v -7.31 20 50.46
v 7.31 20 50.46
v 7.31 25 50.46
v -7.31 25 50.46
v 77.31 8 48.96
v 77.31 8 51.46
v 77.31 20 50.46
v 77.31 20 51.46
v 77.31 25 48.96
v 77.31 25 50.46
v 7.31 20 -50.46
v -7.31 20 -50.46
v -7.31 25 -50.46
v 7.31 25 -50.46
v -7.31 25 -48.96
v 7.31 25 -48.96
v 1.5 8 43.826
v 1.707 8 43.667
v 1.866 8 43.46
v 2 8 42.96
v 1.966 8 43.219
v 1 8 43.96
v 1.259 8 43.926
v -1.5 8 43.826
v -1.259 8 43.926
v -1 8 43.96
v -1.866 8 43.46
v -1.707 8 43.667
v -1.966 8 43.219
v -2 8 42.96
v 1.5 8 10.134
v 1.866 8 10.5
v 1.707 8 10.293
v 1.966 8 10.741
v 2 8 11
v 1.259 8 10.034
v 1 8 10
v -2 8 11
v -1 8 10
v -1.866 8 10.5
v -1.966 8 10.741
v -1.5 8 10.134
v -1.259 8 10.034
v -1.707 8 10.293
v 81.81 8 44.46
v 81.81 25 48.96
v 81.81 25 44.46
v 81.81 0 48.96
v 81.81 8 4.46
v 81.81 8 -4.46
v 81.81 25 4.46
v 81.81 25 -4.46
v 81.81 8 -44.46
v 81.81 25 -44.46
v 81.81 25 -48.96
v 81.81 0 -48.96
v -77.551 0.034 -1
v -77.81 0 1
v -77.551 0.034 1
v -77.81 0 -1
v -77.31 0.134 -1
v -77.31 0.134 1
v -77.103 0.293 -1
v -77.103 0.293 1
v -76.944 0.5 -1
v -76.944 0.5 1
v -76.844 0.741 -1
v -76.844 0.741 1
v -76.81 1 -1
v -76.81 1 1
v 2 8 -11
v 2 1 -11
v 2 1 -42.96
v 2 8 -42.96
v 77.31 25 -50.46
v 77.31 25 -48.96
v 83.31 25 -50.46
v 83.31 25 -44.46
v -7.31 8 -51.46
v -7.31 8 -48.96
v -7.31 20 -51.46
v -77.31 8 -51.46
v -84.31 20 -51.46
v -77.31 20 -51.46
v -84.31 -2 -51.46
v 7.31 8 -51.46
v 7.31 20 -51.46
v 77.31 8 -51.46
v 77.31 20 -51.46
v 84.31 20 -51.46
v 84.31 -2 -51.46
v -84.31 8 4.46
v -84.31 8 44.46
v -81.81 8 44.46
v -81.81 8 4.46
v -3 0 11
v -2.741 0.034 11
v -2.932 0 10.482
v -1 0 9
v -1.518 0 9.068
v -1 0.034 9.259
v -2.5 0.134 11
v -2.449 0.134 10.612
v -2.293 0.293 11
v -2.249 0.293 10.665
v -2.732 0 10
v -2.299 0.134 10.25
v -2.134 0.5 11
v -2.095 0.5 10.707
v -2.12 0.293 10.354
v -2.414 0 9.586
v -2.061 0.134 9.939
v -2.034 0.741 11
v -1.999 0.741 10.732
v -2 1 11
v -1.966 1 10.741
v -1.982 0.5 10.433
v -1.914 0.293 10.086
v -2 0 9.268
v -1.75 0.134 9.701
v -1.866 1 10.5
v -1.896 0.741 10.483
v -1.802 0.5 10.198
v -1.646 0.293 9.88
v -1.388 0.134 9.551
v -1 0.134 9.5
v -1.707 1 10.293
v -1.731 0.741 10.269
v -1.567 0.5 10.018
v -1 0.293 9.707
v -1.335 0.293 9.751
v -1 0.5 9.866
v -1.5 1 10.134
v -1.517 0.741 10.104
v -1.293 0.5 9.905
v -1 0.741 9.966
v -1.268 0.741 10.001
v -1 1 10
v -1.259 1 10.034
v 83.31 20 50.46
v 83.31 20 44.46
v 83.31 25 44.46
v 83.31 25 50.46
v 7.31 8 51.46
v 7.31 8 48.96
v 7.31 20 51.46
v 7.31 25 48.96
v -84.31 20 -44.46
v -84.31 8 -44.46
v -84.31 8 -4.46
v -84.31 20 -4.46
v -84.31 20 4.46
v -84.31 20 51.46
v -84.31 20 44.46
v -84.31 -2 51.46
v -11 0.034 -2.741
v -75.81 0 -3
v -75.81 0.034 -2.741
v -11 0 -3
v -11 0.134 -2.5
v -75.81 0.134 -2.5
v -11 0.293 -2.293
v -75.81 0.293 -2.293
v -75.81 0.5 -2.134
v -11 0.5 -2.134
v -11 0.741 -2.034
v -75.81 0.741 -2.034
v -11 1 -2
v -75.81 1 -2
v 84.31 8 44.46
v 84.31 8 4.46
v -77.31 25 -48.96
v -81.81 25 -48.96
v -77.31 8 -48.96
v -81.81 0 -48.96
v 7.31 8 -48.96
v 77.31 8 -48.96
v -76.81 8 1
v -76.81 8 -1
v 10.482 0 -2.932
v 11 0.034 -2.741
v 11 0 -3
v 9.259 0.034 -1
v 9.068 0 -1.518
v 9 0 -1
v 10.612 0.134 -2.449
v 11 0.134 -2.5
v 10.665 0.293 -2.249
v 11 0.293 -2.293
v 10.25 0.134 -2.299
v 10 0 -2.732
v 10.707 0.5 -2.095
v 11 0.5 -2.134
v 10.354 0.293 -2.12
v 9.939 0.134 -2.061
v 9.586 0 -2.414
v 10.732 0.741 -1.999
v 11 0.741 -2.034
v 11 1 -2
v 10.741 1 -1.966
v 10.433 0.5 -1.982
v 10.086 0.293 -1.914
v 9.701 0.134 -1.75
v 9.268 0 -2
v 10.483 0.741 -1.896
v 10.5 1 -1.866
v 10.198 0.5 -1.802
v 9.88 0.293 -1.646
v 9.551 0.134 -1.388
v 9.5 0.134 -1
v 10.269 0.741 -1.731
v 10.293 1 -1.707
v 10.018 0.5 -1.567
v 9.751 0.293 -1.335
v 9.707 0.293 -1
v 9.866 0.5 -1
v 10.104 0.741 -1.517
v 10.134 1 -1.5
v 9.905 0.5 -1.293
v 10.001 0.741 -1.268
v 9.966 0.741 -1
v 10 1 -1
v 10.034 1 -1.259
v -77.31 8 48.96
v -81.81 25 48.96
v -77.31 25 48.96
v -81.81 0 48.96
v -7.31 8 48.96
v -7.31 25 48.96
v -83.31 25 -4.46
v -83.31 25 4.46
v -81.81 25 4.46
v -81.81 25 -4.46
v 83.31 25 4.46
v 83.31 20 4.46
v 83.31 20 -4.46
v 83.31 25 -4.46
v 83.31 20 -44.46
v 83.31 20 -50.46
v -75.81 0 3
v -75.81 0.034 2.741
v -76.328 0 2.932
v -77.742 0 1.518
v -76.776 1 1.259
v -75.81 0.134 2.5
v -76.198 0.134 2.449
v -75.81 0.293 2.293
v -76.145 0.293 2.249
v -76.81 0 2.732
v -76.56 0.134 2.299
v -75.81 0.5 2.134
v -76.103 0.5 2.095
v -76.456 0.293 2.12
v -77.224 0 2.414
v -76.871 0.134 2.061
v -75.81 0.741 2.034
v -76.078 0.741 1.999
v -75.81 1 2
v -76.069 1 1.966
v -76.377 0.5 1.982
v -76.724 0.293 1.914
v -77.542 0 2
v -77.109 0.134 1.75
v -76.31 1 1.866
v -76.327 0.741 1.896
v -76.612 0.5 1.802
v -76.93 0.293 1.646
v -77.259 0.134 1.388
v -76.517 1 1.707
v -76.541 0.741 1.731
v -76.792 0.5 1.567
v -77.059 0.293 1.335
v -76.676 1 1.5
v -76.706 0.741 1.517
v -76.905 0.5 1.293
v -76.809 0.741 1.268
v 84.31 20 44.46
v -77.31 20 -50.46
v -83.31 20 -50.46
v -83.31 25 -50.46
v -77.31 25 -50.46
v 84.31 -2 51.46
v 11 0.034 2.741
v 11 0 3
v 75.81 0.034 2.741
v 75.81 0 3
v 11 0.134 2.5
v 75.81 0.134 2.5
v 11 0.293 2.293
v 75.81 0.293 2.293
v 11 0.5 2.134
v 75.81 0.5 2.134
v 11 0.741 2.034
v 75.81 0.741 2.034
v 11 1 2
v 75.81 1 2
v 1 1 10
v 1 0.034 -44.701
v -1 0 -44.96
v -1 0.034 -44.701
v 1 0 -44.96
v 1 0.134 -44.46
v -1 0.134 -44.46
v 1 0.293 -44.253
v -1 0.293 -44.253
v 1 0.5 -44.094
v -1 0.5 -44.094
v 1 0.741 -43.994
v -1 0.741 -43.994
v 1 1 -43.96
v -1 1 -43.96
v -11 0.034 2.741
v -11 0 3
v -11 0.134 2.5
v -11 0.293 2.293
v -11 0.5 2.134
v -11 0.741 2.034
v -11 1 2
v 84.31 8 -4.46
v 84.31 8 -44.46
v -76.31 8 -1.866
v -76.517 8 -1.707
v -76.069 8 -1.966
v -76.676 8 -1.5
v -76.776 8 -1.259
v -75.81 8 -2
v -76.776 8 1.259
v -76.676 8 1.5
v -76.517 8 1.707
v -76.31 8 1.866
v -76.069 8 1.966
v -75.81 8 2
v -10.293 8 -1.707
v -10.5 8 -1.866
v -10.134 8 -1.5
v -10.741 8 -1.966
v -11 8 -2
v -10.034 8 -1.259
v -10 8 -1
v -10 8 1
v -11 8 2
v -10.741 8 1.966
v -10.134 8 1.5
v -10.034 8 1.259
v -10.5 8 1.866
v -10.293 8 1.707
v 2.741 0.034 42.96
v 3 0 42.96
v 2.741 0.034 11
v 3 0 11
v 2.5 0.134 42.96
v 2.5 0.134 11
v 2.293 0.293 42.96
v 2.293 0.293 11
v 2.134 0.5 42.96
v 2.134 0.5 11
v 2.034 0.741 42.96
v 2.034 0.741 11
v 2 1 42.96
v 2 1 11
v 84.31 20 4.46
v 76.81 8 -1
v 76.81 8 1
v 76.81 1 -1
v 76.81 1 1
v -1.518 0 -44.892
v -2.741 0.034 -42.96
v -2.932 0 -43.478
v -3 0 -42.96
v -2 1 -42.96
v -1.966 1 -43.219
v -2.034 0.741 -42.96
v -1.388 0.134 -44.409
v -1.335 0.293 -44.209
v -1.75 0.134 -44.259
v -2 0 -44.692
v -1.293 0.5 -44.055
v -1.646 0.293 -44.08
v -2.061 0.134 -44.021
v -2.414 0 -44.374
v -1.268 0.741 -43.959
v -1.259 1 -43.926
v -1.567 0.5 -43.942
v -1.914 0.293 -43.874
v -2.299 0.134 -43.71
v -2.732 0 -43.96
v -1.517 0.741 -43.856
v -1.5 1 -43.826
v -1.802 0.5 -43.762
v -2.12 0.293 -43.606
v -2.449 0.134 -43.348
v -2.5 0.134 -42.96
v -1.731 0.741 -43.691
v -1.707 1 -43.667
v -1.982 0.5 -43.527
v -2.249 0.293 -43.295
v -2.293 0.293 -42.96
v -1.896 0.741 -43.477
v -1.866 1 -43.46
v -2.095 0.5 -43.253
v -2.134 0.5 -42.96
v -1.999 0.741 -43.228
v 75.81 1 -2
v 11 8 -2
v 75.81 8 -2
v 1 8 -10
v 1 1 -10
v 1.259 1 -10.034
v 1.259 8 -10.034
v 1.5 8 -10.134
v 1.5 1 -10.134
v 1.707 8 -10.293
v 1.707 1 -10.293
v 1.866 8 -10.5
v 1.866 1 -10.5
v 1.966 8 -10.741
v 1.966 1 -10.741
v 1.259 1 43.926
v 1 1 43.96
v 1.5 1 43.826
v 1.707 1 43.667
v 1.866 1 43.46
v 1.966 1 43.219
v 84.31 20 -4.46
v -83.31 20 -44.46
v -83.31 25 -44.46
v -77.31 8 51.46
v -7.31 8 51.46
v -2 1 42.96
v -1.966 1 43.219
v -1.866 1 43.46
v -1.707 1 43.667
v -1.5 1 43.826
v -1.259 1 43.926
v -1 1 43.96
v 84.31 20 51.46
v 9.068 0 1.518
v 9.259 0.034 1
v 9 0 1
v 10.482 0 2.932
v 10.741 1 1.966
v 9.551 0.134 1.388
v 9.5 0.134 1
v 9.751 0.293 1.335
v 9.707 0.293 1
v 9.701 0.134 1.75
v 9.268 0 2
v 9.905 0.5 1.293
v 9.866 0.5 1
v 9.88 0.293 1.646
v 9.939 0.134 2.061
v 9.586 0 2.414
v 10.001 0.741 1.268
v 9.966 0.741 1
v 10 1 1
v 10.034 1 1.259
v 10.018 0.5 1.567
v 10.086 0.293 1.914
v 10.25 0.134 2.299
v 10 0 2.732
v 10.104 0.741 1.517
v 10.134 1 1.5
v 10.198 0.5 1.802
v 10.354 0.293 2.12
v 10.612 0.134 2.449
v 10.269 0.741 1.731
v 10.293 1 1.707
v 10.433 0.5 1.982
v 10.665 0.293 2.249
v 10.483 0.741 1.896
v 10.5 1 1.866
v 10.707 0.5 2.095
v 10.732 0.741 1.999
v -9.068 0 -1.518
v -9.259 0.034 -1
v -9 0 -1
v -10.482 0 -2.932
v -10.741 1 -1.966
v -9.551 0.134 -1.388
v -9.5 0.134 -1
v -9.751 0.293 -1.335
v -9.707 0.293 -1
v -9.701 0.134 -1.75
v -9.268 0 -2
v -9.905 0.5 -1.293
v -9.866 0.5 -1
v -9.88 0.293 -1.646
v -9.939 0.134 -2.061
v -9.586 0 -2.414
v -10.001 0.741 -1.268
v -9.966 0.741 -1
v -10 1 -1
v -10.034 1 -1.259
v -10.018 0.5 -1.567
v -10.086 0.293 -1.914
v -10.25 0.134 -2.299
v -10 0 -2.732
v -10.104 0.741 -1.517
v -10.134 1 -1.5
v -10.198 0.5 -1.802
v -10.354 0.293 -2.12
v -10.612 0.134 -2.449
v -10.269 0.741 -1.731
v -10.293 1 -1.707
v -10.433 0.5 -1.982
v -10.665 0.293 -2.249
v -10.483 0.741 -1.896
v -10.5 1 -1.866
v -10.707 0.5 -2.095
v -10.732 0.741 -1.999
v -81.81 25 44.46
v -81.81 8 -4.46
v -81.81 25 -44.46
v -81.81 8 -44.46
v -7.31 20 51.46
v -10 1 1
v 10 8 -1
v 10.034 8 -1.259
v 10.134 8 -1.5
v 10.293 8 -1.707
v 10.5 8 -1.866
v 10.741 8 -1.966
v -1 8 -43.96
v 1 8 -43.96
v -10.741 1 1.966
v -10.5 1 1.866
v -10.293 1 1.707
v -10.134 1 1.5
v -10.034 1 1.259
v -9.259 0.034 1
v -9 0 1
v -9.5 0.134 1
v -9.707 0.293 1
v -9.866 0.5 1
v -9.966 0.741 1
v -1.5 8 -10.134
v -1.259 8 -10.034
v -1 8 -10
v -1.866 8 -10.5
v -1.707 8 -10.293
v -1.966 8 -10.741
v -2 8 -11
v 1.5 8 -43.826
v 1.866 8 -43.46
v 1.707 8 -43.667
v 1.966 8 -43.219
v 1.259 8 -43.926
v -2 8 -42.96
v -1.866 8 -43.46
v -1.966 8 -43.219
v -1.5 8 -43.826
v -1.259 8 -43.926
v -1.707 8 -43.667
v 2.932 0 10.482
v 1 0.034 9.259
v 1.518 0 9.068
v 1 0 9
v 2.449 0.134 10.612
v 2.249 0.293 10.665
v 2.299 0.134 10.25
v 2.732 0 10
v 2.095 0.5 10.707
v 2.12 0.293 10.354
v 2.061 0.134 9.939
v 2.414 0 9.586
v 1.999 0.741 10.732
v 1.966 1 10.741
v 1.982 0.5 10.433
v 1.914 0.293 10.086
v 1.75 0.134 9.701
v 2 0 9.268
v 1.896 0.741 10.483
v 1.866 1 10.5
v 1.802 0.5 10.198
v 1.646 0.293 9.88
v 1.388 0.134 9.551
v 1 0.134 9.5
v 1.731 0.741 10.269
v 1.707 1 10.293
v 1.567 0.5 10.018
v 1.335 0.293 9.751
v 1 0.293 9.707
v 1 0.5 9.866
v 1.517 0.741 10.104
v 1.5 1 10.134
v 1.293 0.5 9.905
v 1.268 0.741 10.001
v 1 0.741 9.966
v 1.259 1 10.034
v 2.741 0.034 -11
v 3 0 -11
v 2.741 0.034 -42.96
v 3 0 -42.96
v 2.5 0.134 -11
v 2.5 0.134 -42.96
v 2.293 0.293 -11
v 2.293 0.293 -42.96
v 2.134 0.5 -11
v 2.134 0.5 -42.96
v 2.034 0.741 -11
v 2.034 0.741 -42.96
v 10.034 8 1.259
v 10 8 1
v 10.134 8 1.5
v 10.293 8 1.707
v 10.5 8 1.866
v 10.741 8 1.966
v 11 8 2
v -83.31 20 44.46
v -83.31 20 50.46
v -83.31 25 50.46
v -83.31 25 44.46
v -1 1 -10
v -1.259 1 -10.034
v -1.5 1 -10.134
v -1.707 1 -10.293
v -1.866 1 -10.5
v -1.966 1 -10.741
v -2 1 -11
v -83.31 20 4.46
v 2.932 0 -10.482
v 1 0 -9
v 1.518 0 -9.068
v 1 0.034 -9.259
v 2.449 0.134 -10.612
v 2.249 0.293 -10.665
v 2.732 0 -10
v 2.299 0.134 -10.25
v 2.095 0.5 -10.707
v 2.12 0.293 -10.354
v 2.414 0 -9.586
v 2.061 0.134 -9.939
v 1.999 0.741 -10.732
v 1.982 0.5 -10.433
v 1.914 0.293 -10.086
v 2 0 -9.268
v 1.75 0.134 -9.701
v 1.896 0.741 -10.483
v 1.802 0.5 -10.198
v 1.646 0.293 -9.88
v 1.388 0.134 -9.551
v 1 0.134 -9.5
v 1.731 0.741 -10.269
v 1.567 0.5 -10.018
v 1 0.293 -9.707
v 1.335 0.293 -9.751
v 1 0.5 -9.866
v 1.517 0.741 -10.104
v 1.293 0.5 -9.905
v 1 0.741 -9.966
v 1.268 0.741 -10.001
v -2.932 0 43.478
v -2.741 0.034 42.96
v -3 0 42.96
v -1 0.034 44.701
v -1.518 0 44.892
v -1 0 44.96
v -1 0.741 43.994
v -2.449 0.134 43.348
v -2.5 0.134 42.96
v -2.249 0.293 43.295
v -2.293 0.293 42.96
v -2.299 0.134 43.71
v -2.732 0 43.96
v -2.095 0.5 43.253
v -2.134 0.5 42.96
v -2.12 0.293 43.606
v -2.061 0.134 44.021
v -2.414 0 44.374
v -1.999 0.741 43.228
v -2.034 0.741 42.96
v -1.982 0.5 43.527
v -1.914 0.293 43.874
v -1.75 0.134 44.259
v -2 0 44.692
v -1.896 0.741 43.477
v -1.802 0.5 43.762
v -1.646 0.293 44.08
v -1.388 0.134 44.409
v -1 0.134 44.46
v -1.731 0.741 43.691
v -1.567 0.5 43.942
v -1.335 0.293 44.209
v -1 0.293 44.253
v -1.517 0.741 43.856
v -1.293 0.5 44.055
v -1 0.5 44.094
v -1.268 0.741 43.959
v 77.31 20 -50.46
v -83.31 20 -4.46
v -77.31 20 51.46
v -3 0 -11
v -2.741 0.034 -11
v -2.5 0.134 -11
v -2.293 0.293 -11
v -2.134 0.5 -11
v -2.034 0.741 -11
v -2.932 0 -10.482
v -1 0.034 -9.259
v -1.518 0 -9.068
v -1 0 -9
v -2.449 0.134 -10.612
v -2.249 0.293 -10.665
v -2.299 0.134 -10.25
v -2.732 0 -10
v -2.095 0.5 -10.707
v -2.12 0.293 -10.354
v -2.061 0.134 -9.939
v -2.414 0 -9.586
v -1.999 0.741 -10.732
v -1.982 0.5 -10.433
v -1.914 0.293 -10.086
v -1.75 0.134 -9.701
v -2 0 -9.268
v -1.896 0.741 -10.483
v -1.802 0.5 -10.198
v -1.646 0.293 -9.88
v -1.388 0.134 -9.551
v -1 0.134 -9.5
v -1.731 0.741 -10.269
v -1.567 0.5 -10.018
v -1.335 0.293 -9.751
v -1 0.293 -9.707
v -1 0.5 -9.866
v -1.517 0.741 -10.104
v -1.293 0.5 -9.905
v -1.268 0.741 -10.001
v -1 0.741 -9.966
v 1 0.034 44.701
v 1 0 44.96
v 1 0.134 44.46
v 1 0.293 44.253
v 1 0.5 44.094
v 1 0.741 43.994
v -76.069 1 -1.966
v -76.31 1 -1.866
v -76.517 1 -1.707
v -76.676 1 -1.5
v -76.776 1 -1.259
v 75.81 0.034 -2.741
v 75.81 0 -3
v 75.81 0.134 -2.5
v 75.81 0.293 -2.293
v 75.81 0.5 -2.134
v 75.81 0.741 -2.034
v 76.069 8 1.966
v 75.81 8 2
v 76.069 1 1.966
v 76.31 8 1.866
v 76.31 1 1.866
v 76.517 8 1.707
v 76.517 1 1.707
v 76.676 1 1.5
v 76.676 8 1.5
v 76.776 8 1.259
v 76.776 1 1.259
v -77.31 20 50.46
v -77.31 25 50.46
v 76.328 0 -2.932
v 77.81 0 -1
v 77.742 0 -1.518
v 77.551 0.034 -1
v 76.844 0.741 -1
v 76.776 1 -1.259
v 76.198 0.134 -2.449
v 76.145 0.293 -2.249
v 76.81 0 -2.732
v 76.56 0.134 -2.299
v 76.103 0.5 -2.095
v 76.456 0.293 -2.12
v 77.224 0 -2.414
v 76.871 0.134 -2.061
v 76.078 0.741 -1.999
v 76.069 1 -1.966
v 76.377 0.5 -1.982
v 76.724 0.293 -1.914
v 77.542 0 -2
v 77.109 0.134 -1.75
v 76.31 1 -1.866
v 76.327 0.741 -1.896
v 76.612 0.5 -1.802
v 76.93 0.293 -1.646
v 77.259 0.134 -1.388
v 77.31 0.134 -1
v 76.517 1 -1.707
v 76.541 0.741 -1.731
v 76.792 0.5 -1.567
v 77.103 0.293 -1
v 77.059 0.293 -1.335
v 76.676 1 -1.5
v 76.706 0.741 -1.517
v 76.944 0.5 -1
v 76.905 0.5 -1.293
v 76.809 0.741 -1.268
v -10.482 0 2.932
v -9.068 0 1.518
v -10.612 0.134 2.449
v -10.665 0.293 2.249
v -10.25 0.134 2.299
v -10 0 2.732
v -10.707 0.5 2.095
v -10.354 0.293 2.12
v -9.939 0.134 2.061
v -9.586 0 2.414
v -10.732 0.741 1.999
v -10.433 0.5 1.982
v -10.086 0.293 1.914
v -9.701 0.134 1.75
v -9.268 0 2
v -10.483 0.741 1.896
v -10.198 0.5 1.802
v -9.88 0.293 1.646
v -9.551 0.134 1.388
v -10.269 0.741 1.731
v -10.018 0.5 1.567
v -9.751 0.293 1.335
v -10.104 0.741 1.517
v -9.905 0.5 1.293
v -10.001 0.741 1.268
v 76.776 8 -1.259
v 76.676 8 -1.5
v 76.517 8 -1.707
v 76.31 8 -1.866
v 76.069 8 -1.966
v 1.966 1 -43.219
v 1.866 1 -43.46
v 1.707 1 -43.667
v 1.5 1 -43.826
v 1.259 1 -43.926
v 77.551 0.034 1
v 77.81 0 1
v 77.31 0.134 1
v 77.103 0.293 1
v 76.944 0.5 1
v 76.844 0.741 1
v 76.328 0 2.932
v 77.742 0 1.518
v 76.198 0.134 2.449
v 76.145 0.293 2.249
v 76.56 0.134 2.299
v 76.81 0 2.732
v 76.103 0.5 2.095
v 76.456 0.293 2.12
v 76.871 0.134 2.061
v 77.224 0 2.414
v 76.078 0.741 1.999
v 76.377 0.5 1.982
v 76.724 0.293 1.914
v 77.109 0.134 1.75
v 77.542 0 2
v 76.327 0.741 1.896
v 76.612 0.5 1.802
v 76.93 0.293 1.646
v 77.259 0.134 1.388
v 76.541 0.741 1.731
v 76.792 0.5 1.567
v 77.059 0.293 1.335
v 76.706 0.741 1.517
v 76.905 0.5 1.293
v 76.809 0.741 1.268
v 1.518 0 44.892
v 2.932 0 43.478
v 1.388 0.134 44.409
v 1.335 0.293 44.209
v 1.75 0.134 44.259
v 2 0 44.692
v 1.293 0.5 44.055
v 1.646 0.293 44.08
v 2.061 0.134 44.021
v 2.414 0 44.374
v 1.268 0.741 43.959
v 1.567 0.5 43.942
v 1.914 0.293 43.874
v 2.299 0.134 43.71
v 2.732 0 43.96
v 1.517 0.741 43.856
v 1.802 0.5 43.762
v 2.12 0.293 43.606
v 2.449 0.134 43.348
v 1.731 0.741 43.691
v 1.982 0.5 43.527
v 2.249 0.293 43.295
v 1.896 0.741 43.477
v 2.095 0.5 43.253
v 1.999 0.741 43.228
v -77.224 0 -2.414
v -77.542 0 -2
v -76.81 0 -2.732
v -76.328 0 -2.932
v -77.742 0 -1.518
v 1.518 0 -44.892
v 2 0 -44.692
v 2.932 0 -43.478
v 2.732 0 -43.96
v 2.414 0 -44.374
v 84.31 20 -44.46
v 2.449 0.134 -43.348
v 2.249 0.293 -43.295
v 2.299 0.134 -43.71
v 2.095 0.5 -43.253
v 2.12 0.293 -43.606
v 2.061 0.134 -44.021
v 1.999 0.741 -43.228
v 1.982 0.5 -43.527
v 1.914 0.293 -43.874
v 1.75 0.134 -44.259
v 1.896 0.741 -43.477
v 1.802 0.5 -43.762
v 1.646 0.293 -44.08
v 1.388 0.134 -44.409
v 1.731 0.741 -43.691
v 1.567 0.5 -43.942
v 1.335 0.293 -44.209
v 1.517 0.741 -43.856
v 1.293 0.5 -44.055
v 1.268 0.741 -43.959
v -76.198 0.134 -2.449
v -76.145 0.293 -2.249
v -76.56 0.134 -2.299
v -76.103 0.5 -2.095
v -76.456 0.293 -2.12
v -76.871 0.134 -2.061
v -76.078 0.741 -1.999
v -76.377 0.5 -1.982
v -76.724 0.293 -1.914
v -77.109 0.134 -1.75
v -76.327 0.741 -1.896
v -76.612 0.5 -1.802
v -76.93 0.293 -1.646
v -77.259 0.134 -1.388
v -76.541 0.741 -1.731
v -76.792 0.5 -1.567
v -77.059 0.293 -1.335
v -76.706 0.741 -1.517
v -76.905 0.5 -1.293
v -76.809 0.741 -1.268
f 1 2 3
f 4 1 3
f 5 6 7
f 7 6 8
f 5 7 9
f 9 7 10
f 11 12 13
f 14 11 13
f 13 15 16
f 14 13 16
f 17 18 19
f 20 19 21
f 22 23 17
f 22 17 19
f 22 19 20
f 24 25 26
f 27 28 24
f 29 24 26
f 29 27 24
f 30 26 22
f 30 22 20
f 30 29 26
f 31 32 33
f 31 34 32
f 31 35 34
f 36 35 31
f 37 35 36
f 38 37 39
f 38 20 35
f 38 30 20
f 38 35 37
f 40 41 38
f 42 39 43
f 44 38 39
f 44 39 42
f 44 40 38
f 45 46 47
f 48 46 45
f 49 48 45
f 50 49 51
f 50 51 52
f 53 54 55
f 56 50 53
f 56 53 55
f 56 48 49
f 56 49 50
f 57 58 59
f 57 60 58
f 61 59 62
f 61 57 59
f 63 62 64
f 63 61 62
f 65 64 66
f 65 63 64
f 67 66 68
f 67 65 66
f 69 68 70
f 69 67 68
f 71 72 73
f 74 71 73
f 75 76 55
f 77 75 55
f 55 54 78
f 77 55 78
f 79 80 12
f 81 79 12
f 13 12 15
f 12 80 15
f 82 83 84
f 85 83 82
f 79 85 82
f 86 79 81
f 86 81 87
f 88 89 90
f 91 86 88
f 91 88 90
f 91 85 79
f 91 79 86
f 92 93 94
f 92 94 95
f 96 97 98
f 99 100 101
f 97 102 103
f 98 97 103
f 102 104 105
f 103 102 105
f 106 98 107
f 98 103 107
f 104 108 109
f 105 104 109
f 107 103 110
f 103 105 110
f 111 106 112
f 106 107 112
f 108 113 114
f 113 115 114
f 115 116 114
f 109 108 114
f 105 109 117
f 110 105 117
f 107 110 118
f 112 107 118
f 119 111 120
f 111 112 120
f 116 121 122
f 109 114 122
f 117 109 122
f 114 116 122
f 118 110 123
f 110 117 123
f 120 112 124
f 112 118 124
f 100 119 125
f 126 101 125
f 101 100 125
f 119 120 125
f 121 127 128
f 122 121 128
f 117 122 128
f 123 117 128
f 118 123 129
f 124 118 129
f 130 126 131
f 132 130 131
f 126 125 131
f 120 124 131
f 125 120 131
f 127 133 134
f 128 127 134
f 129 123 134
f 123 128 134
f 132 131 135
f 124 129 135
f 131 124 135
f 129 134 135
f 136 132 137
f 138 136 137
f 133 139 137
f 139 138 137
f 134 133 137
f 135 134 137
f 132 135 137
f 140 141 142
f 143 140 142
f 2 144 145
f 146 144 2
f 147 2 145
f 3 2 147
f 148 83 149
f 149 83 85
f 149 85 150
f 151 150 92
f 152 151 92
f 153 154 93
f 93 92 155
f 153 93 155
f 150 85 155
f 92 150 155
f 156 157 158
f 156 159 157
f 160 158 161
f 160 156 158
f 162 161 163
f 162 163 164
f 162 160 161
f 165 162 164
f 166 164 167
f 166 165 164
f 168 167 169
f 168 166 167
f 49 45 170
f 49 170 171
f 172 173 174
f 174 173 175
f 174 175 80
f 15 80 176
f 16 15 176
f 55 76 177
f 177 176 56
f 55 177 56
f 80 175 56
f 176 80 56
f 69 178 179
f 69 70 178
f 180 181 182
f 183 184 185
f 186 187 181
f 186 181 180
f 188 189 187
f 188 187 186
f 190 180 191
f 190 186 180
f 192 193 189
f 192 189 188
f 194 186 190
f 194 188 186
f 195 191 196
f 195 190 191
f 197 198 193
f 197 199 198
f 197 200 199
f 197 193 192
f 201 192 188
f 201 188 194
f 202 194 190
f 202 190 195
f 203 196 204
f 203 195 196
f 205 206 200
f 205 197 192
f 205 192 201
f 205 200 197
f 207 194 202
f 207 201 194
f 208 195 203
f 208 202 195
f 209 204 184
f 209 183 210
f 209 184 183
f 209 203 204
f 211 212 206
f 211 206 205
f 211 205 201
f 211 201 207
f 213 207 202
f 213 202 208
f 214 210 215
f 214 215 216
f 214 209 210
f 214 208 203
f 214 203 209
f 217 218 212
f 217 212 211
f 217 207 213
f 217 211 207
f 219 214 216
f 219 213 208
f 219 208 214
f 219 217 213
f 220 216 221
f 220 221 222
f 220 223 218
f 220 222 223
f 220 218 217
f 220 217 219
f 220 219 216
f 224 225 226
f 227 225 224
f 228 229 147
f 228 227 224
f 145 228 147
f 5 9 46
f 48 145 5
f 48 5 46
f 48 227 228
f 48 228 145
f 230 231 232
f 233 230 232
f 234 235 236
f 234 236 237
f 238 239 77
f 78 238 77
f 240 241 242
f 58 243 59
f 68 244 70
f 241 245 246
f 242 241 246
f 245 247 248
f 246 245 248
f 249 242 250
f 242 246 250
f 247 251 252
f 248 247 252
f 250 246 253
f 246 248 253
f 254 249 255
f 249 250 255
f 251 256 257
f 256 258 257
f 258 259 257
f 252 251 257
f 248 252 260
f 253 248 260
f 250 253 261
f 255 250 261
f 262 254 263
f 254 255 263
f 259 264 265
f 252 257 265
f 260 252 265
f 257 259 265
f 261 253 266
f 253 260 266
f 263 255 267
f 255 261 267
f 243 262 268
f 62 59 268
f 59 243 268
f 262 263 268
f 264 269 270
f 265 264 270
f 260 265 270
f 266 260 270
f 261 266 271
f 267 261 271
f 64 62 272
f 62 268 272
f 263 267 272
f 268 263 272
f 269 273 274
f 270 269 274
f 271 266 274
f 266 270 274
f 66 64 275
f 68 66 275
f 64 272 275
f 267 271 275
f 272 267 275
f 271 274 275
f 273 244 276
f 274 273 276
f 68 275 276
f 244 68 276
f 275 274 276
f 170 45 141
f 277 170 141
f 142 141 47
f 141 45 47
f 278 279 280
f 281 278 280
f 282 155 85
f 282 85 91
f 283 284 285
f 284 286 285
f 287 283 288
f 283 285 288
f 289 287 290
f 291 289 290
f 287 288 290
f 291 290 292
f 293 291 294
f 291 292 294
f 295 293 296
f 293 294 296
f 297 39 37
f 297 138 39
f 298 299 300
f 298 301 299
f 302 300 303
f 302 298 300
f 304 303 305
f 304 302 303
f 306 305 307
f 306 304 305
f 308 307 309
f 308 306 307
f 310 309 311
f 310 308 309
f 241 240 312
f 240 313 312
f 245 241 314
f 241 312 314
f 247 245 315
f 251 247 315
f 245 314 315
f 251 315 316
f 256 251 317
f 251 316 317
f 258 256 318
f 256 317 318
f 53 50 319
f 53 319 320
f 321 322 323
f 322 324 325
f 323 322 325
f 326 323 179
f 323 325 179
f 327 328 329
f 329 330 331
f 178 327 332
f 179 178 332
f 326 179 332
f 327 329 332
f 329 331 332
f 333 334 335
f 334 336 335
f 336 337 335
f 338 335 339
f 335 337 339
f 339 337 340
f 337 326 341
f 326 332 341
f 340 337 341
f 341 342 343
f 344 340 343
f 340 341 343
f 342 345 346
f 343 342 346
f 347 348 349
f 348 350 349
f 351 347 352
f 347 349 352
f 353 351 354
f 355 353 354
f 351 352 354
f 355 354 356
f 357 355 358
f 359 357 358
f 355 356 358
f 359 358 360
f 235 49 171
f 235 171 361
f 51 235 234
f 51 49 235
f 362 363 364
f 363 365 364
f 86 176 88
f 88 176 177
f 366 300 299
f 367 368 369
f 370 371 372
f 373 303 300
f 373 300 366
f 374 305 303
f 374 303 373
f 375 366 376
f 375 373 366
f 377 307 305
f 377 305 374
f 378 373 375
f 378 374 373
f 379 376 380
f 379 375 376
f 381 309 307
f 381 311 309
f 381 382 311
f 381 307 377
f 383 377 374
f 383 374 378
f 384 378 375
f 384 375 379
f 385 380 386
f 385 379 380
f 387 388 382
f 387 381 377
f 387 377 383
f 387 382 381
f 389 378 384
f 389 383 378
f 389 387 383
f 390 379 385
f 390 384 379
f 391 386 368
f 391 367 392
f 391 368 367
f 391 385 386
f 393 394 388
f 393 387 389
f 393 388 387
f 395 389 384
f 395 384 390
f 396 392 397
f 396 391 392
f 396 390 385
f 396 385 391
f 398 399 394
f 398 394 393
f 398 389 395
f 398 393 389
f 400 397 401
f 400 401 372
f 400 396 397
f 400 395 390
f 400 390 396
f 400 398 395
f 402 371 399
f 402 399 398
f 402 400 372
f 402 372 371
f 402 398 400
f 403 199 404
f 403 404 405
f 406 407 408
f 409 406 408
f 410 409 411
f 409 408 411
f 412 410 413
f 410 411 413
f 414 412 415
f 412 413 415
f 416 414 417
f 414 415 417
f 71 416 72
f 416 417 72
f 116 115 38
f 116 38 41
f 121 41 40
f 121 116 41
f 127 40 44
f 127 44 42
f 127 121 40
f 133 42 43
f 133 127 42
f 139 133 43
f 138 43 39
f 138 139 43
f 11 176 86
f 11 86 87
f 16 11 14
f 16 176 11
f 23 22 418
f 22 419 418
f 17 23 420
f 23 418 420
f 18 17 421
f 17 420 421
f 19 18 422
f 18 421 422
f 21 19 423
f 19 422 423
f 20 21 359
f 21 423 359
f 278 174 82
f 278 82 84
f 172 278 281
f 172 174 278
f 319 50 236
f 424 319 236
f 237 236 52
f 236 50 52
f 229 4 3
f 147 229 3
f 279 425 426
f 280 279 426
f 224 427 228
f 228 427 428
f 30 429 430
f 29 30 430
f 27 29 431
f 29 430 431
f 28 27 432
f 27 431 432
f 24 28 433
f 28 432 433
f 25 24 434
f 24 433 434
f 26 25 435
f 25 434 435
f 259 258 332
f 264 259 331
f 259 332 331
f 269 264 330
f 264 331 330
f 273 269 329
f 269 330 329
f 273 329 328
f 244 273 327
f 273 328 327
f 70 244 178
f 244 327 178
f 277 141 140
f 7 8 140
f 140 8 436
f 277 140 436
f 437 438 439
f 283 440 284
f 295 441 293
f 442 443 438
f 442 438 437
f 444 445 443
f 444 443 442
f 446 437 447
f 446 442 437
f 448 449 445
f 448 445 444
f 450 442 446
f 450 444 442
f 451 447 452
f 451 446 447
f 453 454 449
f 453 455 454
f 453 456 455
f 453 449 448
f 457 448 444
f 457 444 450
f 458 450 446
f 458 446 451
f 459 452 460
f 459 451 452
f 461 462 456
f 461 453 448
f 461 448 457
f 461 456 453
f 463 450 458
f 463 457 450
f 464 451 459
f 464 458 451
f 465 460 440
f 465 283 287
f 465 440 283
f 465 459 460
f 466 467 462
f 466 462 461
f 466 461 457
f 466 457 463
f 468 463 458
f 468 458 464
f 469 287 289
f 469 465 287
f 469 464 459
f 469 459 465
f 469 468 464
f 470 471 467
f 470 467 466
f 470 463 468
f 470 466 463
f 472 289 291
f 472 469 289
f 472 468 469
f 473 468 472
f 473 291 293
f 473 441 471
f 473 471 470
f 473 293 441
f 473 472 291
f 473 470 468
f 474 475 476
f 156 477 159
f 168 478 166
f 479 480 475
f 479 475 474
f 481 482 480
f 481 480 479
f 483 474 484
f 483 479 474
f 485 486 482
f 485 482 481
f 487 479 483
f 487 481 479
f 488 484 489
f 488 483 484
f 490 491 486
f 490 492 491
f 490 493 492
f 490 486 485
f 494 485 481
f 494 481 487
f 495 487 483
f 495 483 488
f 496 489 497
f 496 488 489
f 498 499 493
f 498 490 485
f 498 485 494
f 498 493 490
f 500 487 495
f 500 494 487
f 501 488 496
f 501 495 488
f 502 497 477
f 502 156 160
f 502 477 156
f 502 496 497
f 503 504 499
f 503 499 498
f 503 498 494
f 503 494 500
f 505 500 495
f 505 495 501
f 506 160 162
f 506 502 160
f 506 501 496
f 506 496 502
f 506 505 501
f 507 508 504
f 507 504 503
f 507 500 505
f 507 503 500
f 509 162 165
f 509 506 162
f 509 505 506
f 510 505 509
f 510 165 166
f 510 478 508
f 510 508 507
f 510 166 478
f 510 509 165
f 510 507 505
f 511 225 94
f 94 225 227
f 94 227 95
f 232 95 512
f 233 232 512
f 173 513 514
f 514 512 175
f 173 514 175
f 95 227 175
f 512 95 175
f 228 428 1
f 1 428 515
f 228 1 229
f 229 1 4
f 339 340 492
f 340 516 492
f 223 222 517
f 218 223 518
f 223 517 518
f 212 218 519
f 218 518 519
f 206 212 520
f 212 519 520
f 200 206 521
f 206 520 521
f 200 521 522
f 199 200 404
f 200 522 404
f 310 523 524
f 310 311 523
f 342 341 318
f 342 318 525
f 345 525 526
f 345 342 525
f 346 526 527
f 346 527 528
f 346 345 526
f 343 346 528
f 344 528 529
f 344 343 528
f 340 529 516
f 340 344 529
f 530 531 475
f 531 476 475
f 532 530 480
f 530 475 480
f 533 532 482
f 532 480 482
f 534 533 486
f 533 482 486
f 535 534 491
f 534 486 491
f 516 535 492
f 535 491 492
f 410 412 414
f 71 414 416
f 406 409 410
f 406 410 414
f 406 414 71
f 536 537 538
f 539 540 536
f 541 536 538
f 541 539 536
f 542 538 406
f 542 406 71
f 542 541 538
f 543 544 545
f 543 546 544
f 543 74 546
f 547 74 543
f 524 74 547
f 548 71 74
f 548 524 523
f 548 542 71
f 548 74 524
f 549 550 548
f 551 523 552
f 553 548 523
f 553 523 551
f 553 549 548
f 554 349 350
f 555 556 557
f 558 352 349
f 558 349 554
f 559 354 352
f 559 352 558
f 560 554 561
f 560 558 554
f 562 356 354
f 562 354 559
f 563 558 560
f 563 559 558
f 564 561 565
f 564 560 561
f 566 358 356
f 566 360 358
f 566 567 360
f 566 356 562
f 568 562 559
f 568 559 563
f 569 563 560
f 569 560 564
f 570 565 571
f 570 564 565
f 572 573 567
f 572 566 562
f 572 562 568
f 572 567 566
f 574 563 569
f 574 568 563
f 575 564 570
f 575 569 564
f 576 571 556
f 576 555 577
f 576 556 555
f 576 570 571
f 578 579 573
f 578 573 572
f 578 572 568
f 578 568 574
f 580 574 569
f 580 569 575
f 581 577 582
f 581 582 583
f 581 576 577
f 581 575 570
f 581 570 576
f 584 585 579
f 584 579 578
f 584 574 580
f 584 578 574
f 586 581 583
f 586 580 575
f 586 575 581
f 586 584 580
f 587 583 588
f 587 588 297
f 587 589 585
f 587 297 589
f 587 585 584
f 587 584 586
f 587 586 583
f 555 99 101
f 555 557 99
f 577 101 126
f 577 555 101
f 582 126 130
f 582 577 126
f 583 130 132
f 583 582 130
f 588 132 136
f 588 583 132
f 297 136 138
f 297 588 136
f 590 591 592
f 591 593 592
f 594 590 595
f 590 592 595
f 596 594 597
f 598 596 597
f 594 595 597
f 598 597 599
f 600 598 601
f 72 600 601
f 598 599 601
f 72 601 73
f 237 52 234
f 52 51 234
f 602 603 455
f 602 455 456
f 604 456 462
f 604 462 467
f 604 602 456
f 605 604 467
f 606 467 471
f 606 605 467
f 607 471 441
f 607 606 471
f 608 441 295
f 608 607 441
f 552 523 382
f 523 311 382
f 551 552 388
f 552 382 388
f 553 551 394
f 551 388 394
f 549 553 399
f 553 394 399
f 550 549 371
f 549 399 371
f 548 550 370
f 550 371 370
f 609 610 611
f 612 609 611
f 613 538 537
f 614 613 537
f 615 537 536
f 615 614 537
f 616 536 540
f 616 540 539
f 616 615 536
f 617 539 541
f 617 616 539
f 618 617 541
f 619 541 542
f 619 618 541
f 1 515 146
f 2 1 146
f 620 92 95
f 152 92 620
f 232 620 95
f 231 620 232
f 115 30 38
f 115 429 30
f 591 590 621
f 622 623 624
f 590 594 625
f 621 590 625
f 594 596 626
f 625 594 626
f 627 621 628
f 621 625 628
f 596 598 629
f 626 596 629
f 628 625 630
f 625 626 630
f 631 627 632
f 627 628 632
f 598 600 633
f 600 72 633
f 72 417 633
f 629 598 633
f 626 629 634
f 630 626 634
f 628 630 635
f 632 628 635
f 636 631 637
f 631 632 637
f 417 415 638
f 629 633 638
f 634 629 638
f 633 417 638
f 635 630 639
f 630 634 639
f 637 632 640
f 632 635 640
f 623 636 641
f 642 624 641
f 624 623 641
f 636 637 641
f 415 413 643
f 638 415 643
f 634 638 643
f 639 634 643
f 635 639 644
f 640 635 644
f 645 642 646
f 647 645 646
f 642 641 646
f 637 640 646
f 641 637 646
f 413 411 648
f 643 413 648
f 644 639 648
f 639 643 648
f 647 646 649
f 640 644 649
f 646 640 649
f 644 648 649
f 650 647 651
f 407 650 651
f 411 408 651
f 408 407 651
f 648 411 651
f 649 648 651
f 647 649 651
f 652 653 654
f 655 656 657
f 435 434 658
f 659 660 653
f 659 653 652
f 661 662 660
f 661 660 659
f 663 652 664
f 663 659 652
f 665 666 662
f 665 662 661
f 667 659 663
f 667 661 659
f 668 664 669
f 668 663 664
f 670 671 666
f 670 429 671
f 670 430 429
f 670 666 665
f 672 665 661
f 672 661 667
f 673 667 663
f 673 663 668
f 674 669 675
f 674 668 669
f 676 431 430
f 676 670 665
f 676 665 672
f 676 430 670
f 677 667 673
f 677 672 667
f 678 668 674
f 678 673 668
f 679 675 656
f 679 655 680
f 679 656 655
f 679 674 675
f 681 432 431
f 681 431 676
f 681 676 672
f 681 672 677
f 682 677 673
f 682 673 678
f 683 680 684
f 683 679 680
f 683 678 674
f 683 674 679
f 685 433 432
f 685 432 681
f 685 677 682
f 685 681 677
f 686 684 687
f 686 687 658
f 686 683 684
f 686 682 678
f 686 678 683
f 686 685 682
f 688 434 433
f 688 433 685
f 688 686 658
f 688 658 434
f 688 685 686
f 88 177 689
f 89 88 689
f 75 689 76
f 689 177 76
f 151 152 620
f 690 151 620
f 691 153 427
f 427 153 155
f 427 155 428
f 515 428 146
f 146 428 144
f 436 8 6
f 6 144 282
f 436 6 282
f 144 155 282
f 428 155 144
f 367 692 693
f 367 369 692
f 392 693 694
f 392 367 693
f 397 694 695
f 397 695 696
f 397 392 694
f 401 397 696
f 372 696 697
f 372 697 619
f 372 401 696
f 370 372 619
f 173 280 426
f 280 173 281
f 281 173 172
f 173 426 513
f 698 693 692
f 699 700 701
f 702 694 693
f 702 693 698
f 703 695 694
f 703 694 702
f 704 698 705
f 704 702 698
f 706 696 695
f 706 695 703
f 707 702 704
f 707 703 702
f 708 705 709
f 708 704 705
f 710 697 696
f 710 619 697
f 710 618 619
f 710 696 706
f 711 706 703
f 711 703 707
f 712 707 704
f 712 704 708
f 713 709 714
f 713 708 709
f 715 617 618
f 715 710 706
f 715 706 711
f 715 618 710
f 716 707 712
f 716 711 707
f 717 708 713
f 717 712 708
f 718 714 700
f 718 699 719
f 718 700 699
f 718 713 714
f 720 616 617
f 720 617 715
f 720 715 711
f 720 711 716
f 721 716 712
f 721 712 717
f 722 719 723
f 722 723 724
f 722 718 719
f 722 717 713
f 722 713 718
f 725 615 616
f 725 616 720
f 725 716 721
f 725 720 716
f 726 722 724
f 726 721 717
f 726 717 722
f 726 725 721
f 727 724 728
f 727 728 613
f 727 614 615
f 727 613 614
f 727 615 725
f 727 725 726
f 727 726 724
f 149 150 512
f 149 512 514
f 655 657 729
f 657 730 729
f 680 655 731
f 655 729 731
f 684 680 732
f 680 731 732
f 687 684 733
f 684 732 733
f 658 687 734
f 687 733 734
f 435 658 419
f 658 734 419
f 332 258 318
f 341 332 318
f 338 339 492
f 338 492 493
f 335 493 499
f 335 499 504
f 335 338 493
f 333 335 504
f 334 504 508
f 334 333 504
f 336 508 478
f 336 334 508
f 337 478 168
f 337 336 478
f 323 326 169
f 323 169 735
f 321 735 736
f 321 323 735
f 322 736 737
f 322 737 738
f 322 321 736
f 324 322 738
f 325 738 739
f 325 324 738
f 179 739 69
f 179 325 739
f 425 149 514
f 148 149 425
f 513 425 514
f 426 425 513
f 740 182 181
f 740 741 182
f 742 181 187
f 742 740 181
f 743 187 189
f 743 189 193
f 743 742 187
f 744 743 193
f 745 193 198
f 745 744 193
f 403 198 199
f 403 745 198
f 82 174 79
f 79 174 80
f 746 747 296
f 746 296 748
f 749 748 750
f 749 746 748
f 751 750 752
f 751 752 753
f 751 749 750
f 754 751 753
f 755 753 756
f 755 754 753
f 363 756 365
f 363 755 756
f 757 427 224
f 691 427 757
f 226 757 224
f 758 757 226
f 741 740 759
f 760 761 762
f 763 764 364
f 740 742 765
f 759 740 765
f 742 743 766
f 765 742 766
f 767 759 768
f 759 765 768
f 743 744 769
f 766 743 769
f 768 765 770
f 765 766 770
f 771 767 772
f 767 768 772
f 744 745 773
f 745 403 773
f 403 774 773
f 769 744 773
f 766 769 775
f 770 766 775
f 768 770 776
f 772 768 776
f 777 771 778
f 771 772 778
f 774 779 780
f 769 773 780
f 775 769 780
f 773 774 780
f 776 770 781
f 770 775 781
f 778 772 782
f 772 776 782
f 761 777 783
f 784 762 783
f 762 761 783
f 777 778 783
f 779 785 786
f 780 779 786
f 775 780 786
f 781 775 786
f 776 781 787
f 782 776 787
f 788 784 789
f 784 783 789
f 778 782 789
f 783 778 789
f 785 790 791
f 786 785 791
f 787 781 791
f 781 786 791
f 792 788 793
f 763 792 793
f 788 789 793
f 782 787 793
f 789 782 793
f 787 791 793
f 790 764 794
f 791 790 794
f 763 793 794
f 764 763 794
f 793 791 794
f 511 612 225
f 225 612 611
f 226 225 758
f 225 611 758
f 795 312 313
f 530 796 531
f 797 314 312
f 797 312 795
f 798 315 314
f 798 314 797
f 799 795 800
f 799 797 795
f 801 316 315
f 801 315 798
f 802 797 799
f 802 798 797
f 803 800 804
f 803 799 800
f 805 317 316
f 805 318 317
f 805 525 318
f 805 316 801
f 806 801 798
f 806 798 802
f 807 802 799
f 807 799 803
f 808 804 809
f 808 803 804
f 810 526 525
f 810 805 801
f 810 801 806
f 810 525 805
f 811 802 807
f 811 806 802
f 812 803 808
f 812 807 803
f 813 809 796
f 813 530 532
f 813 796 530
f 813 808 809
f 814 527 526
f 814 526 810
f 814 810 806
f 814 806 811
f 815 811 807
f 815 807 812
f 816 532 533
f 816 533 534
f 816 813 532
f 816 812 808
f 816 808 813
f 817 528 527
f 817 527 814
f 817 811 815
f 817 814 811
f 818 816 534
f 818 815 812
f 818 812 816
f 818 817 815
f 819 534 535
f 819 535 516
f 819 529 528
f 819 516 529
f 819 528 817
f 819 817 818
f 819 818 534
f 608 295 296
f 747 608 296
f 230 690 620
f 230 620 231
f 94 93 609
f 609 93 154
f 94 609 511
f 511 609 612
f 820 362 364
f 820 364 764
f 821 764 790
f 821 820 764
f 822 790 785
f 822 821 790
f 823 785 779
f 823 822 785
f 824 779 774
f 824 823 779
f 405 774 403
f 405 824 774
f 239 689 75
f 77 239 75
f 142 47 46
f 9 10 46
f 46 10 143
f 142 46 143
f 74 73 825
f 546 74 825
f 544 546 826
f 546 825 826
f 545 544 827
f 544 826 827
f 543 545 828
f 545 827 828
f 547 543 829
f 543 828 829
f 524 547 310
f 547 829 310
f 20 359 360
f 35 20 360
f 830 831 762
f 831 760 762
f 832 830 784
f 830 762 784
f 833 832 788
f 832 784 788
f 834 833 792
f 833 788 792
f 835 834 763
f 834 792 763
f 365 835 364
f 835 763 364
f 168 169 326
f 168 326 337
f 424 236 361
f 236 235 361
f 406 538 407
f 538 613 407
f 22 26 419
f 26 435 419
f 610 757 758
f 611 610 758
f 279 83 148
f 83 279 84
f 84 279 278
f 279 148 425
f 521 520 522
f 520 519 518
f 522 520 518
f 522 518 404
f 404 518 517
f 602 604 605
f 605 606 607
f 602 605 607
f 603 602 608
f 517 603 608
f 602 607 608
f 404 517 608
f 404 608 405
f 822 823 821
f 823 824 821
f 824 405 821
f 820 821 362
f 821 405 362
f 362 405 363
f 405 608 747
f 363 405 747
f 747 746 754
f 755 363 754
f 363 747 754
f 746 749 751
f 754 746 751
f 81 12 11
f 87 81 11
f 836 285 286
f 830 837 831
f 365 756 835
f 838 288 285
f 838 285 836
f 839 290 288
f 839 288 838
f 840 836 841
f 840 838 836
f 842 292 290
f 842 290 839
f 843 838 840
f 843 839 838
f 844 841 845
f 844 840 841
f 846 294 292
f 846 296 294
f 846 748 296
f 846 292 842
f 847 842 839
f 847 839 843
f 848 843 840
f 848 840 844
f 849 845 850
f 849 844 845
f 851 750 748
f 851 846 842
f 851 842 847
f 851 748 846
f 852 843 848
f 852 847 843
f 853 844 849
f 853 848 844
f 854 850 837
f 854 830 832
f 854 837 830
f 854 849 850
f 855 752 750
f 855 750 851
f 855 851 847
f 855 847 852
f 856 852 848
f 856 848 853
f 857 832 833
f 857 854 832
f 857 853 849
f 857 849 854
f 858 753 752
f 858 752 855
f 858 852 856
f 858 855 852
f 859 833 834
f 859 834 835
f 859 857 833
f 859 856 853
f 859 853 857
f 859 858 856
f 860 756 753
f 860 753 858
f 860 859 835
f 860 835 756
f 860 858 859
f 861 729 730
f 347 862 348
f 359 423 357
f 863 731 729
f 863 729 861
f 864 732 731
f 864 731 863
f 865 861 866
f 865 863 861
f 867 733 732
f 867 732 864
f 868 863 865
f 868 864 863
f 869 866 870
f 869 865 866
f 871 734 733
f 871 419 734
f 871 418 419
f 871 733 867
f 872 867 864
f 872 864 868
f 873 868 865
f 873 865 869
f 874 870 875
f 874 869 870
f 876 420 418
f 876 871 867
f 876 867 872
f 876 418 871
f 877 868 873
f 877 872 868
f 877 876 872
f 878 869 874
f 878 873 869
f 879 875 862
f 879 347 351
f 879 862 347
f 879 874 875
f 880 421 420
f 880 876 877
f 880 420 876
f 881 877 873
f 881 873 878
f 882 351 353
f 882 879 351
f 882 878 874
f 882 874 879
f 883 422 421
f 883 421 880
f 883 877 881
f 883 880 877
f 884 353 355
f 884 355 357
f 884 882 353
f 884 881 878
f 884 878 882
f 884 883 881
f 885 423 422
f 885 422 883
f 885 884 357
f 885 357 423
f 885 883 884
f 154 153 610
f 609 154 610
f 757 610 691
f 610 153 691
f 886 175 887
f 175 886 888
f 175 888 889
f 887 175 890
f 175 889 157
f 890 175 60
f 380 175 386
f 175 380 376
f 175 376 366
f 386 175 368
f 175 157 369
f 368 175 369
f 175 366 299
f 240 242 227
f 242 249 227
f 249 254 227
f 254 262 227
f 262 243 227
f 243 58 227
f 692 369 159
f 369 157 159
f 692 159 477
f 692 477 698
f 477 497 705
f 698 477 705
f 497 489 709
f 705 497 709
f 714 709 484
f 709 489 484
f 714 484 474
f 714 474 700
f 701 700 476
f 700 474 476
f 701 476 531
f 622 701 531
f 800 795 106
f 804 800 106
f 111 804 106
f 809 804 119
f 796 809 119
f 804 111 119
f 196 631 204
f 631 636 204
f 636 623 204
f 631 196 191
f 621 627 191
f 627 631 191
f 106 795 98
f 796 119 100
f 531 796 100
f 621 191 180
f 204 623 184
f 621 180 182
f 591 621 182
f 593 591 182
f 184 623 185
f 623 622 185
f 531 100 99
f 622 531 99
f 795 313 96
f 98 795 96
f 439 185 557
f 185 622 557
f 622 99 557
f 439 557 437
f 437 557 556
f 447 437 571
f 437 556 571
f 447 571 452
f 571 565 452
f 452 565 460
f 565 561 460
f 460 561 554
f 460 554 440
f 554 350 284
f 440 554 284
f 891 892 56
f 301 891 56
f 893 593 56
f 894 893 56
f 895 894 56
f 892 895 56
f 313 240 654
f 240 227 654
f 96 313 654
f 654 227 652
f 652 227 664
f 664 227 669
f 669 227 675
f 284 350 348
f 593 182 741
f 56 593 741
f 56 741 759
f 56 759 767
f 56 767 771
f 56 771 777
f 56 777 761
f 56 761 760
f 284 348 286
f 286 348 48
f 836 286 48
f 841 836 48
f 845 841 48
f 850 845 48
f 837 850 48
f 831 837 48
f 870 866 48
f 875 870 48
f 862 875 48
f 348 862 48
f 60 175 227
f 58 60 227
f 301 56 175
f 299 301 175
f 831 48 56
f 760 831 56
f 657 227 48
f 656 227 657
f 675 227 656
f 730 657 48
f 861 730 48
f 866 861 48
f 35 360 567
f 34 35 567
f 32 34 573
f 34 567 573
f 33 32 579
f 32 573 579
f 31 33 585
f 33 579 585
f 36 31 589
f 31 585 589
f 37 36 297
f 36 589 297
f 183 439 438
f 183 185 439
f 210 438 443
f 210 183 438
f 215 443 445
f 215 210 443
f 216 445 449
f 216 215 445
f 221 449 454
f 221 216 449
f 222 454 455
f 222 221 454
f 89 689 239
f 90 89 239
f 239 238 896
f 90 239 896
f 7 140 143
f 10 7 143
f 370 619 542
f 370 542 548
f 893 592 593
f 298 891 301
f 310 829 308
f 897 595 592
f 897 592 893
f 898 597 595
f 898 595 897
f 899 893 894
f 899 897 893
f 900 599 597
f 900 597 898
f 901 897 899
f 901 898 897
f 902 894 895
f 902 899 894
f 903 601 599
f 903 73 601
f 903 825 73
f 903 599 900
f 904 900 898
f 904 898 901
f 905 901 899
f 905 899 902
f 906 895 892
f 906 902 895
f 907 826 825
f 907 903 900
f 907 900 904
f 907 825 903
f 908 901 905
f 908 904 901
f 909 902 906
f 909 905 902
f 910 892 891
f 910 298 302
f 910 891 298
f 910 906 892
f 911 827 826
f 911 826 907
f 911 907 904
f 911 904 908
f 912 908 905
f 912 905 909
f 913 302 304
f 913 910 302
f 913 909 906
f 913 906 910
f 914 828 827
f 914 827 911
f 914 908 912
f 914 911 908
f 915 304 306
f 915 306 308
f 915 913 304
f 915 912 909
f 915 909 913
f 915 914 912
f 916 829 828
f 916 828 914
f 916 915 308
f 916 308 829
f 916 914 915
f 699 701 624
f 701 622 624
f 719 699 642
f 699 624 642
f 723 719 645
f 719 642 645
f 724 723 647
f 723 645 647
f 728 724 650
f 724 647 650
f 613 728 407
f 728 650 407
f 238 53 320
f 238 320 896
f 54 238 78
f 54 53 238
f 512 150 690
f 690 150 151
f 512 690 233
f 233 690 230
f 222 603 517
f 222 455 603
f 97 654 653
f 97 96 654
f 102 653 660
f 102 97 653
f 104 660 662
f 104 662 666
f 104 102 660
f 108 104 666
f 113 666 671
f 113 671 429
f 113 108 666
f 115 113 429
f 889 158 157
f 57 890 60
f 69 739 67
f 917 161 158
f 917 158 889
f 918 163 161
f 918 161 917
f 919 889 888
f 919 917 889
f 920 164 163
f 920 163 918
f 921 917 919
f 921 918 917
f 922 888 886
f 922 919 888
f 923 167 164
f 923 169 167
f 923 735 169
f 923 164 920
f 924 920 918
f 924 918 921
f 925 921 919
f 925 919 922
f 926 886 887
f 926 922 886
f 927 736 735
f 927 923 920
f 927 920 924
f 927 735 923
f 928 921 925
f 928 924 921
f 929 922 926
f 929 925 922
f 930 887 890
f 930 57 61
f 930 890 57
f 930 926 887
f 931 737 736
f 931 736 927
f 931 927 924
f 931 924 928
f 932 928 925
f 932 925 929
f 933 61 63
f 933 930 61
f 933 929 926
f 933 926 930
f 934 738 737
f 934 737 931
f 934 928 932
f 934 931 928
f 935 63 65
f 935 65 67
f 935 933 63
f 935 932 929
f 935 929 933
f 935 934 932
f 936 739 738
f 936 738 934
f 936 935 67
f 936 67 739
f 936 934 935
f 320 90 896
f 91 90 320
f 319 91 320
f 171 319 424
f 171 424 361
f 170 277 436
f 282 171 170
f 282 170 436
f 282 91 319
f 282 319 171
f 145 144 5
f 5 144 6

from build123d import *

# Parameters (mm, degrees)
SKETCH1_W               = 166.62
SKETCH1_H               = 100.92
SKETCH1_W_2             = 79.81
SKETCH1_H_2             = 46.96
BOSS_EXTRUDE1_DEPTH     = 25
SKETCH2_W               = 166.62
SKETCH2_H               = 100.92
BOSS_EXTRUDE2_DEPTH     = 2
SKETCH3_W               = 20
SKETCH3_H               = 20
SKETCH3_W_2             = 5
SKETCH3_H_2             = 30
SKETCH3_W_3             = 25
SKETCH3_H_3             = 5
CUT_EXTRUDE1_DEPTH      = 101.557285663
SKETCH4_W               = 168.62
SKETCH4_H               = 102.92
SKETCH4_W_2             = 166.62
SKETCH4_H_2             = 100.92
BOSS_EXTRUDE3_DEPTH     = 27
FILLET1_R               = 1
SKETCH5_W               = 1
SKETCH5_H               = 5
SKETCH8_W               = 70
SKETCH8_H               = 44.022863743
CUT_EXTRUDE2_DEPTH      = 136.372458425
CUT_EXTRUDE3_DEPTH      = 2
CUT_EXTRUDE3_DEPTH_BACK = 179.061326514
SKETCH9_W               = 40
SKETCH9_H               = 21.691425142


with BuildPart() as part:
    # Sketch1 → Boss-Extrude1 (new body)
    with BuildSketch(Plane(origin=(0, 0, 0), x_dir=(1, 0, 0), z_dir=(0, 1, 0))):
        Rectangle(SKETCH1_W, SKETCH1_H)
        with Locations((41.905, 25.48)):
            Rectangle(SKETCH1_W_2, SKETCH1_H_2, mode=Mode.SUBTRACT)
        with Locations((41.905, -25.48)):
            Rectangle(SKETCH1_W_2, SKETCH1_H_2, mode=Mode.SUBTRACT)
        with Locations((-41.905, 25.48)):
            Rectangle(SKETCH1_W_2, SKETCH1_H_2, mode=Mode.SUBTRACT)
        with Locations((-41.905, -25.48)):
            Rectangle(SKETCH1_W_2, SKETCH1_H_2, mode=Mode.SUBTRACT)
    extrude(amount=BOSS_EXTRUDE1_DEPTH)

    # Sketch2 → Boss-Extrude2 (add)
    with BuildSketch(Plane.XZ):
        Rectangle(SKETCH2_W, SKETCH2_H)
    extrude(amount=BOSS_EXTRUDE2_DEPTH)

    # Sketch3 → Cut-Extrude1 (cut, through all)
    with BuildSketch(Plane(origin=(0, 0, 0), x_dir=(1, 0, 0), z_dir=(0, 1, 0))):
        Rectangle(SKETCH3_W, SKETCH3_H)
        with Locations((-79.31, 0)):
            Rectangle(SKETCH3_W_2, SKETCH3_H_2)
        with Locations((0, 46.46)):
            Rectangle(SKETCH3_W_3, SKETCH3_H_3)
        with Locations((0, -46.46)):
            Rectangle(SKETCH3_W_3, SKETCH3_H_3)
        with Locations((79.31, 0)):
            Rectangle(SKETCH3_W_2, SKETCH3_H_2)
    extrude(amount=CUT_EXTRUDE1_DEPTH, mode=Mode.SUBTRACT)

    # Sketch4 → Boss-Extrude3 (add)
    with BuildSketch(Plane.XZ.offset(2)):
        Rectangle(SKETCH4_W, SKETCH4_H)
        Rectangle(SKETCH4_W_2, SKETCH4_H_2, mode=Mode.SUBTRACT)
    extrude(amount=-BOSS_EXTRUDE3_DEPTH)

    # Fillet1
    fillet1_edges = [part.edges().sort_by_distance(p)[0] for p in [
        (-43.405, 0, 2),
        (43.405, 0, -2),
        (43.405, 25, -2),
        (-43.405, 25, 2),
        (2, 25, 26.98),
        (-2, 25, -26.98),
        (-10, 12.5, -2),
        (-10, 0, 0),
        (-10, 12.5, 2),
        (0, 0, 10),
        (2, 12.5, 10),
        (-2, 12.5, 10),
        (10, 12.5, 2),
        (10, 0, 0),
        (10, 12.5, -2),
        (0, 0, -10),
        (-2, 12.5, -10),
        (2, 12.5, -10),
        (-43.405, 0, -2),
        (-43.405, 25, -2),
        (-76.81, 0, 0),
        (-76.81, 12.5, -2),
        (-76.81, 12.5, 2),
        (2, 0, -26.98),
        (2, 25, -26.98),
        (-2, 12.5, -43.96),
        (0, 0, -43.96),
        (2, 12.5, -43.96),
        (-2, 0, 26.98),
        (-2, 25, 26.98),
        (2, 12.5, 43.96),
        (0, 0, 43.96),
        (-2, 12.5, 43.96),
        (43.405, 0, 2),
        (43.405, 25, 2),
        (76.81, 0, 0),
        (76.81, 12.5, 2),
        (76.81, 12.5, -2),
        (-2, 0, -26.98),
        (2, 0, 26.98),
    ]]
    fillet(fillet1_edges, radius=FILLET1_R)

    # Cut-Sweep1: sweep along a path in Sketch7
    with BuildLine(Plane(origin=(0, 25, 0), x_dir=(1, 0, 0), z_dir=(0, 1, 0))) as cut_sweep1_path:
        Line((-84.31, -51.46), (84.31, -51.46))
        Line((84.31, -51.46), (84.31, 51.46))
        Line((84.31, 51.46), (-84.31, 51.46))
        Line((-84.31, 51.46), (-84.31, -51.46))
    # Sketch5 → Cut-Sweep1 (sweep, cut)
    with BuildSketch(Plane(origin=(84.31, 0, 0), x_dir=(0, 0, -1), z_dir=(1, 0, 0))):
        with Locations((-50.96, 22.5)):
            Rectangle(SKETCH5_W, SKETCH5_H)
    sweep(path=cut_sweep1_path.line, transition=Transition.RIGHT, mode=Mode.SUBTRACT)

    # Sketch8 → Cut-Extrude2 (cut, through all)
    with BuildSketch(Plane.XY.offset(51.46)):
        with Locations((-42.31, 30.011431872)):
            Rectangle(SKETCH8_W, SKETCH8_H)
        with Locations((42.31, 30.011431872)):
            Rectangle(SKETCH8_W, SKETCH8_H)
    extrude(amount=-CUT_EXTRUDE2_DEPTH, mode=Mode.SUBTRACT)

    # Sketch9 → Cut-Extrude3 (cut, two sides: drawn at the far end of the back side and taken through both)
    with BuildSketch(Plane(origin=(84.31, 0, 0), x_dir=(0, 0, -1), z_dir=(1, 0, 0)).offset(-CUT_EXTRUDE3_DEPTH_BACK)):
        with Locations((-24.46, 18.845712571)):
            Rectangle(SKETCH9_W, SKETCH9_H)
        with Locations((24.46, 18.845712571)):
            Rectangle(SKETCH9_W, SKETCH9_H)
    extrude(amount=CUT_EXTRUDE3_DEPTH + CUT_EXTRUDE3_DEPTH_BACK, mode=Mode.SUBTRACT)


solid = part.part
